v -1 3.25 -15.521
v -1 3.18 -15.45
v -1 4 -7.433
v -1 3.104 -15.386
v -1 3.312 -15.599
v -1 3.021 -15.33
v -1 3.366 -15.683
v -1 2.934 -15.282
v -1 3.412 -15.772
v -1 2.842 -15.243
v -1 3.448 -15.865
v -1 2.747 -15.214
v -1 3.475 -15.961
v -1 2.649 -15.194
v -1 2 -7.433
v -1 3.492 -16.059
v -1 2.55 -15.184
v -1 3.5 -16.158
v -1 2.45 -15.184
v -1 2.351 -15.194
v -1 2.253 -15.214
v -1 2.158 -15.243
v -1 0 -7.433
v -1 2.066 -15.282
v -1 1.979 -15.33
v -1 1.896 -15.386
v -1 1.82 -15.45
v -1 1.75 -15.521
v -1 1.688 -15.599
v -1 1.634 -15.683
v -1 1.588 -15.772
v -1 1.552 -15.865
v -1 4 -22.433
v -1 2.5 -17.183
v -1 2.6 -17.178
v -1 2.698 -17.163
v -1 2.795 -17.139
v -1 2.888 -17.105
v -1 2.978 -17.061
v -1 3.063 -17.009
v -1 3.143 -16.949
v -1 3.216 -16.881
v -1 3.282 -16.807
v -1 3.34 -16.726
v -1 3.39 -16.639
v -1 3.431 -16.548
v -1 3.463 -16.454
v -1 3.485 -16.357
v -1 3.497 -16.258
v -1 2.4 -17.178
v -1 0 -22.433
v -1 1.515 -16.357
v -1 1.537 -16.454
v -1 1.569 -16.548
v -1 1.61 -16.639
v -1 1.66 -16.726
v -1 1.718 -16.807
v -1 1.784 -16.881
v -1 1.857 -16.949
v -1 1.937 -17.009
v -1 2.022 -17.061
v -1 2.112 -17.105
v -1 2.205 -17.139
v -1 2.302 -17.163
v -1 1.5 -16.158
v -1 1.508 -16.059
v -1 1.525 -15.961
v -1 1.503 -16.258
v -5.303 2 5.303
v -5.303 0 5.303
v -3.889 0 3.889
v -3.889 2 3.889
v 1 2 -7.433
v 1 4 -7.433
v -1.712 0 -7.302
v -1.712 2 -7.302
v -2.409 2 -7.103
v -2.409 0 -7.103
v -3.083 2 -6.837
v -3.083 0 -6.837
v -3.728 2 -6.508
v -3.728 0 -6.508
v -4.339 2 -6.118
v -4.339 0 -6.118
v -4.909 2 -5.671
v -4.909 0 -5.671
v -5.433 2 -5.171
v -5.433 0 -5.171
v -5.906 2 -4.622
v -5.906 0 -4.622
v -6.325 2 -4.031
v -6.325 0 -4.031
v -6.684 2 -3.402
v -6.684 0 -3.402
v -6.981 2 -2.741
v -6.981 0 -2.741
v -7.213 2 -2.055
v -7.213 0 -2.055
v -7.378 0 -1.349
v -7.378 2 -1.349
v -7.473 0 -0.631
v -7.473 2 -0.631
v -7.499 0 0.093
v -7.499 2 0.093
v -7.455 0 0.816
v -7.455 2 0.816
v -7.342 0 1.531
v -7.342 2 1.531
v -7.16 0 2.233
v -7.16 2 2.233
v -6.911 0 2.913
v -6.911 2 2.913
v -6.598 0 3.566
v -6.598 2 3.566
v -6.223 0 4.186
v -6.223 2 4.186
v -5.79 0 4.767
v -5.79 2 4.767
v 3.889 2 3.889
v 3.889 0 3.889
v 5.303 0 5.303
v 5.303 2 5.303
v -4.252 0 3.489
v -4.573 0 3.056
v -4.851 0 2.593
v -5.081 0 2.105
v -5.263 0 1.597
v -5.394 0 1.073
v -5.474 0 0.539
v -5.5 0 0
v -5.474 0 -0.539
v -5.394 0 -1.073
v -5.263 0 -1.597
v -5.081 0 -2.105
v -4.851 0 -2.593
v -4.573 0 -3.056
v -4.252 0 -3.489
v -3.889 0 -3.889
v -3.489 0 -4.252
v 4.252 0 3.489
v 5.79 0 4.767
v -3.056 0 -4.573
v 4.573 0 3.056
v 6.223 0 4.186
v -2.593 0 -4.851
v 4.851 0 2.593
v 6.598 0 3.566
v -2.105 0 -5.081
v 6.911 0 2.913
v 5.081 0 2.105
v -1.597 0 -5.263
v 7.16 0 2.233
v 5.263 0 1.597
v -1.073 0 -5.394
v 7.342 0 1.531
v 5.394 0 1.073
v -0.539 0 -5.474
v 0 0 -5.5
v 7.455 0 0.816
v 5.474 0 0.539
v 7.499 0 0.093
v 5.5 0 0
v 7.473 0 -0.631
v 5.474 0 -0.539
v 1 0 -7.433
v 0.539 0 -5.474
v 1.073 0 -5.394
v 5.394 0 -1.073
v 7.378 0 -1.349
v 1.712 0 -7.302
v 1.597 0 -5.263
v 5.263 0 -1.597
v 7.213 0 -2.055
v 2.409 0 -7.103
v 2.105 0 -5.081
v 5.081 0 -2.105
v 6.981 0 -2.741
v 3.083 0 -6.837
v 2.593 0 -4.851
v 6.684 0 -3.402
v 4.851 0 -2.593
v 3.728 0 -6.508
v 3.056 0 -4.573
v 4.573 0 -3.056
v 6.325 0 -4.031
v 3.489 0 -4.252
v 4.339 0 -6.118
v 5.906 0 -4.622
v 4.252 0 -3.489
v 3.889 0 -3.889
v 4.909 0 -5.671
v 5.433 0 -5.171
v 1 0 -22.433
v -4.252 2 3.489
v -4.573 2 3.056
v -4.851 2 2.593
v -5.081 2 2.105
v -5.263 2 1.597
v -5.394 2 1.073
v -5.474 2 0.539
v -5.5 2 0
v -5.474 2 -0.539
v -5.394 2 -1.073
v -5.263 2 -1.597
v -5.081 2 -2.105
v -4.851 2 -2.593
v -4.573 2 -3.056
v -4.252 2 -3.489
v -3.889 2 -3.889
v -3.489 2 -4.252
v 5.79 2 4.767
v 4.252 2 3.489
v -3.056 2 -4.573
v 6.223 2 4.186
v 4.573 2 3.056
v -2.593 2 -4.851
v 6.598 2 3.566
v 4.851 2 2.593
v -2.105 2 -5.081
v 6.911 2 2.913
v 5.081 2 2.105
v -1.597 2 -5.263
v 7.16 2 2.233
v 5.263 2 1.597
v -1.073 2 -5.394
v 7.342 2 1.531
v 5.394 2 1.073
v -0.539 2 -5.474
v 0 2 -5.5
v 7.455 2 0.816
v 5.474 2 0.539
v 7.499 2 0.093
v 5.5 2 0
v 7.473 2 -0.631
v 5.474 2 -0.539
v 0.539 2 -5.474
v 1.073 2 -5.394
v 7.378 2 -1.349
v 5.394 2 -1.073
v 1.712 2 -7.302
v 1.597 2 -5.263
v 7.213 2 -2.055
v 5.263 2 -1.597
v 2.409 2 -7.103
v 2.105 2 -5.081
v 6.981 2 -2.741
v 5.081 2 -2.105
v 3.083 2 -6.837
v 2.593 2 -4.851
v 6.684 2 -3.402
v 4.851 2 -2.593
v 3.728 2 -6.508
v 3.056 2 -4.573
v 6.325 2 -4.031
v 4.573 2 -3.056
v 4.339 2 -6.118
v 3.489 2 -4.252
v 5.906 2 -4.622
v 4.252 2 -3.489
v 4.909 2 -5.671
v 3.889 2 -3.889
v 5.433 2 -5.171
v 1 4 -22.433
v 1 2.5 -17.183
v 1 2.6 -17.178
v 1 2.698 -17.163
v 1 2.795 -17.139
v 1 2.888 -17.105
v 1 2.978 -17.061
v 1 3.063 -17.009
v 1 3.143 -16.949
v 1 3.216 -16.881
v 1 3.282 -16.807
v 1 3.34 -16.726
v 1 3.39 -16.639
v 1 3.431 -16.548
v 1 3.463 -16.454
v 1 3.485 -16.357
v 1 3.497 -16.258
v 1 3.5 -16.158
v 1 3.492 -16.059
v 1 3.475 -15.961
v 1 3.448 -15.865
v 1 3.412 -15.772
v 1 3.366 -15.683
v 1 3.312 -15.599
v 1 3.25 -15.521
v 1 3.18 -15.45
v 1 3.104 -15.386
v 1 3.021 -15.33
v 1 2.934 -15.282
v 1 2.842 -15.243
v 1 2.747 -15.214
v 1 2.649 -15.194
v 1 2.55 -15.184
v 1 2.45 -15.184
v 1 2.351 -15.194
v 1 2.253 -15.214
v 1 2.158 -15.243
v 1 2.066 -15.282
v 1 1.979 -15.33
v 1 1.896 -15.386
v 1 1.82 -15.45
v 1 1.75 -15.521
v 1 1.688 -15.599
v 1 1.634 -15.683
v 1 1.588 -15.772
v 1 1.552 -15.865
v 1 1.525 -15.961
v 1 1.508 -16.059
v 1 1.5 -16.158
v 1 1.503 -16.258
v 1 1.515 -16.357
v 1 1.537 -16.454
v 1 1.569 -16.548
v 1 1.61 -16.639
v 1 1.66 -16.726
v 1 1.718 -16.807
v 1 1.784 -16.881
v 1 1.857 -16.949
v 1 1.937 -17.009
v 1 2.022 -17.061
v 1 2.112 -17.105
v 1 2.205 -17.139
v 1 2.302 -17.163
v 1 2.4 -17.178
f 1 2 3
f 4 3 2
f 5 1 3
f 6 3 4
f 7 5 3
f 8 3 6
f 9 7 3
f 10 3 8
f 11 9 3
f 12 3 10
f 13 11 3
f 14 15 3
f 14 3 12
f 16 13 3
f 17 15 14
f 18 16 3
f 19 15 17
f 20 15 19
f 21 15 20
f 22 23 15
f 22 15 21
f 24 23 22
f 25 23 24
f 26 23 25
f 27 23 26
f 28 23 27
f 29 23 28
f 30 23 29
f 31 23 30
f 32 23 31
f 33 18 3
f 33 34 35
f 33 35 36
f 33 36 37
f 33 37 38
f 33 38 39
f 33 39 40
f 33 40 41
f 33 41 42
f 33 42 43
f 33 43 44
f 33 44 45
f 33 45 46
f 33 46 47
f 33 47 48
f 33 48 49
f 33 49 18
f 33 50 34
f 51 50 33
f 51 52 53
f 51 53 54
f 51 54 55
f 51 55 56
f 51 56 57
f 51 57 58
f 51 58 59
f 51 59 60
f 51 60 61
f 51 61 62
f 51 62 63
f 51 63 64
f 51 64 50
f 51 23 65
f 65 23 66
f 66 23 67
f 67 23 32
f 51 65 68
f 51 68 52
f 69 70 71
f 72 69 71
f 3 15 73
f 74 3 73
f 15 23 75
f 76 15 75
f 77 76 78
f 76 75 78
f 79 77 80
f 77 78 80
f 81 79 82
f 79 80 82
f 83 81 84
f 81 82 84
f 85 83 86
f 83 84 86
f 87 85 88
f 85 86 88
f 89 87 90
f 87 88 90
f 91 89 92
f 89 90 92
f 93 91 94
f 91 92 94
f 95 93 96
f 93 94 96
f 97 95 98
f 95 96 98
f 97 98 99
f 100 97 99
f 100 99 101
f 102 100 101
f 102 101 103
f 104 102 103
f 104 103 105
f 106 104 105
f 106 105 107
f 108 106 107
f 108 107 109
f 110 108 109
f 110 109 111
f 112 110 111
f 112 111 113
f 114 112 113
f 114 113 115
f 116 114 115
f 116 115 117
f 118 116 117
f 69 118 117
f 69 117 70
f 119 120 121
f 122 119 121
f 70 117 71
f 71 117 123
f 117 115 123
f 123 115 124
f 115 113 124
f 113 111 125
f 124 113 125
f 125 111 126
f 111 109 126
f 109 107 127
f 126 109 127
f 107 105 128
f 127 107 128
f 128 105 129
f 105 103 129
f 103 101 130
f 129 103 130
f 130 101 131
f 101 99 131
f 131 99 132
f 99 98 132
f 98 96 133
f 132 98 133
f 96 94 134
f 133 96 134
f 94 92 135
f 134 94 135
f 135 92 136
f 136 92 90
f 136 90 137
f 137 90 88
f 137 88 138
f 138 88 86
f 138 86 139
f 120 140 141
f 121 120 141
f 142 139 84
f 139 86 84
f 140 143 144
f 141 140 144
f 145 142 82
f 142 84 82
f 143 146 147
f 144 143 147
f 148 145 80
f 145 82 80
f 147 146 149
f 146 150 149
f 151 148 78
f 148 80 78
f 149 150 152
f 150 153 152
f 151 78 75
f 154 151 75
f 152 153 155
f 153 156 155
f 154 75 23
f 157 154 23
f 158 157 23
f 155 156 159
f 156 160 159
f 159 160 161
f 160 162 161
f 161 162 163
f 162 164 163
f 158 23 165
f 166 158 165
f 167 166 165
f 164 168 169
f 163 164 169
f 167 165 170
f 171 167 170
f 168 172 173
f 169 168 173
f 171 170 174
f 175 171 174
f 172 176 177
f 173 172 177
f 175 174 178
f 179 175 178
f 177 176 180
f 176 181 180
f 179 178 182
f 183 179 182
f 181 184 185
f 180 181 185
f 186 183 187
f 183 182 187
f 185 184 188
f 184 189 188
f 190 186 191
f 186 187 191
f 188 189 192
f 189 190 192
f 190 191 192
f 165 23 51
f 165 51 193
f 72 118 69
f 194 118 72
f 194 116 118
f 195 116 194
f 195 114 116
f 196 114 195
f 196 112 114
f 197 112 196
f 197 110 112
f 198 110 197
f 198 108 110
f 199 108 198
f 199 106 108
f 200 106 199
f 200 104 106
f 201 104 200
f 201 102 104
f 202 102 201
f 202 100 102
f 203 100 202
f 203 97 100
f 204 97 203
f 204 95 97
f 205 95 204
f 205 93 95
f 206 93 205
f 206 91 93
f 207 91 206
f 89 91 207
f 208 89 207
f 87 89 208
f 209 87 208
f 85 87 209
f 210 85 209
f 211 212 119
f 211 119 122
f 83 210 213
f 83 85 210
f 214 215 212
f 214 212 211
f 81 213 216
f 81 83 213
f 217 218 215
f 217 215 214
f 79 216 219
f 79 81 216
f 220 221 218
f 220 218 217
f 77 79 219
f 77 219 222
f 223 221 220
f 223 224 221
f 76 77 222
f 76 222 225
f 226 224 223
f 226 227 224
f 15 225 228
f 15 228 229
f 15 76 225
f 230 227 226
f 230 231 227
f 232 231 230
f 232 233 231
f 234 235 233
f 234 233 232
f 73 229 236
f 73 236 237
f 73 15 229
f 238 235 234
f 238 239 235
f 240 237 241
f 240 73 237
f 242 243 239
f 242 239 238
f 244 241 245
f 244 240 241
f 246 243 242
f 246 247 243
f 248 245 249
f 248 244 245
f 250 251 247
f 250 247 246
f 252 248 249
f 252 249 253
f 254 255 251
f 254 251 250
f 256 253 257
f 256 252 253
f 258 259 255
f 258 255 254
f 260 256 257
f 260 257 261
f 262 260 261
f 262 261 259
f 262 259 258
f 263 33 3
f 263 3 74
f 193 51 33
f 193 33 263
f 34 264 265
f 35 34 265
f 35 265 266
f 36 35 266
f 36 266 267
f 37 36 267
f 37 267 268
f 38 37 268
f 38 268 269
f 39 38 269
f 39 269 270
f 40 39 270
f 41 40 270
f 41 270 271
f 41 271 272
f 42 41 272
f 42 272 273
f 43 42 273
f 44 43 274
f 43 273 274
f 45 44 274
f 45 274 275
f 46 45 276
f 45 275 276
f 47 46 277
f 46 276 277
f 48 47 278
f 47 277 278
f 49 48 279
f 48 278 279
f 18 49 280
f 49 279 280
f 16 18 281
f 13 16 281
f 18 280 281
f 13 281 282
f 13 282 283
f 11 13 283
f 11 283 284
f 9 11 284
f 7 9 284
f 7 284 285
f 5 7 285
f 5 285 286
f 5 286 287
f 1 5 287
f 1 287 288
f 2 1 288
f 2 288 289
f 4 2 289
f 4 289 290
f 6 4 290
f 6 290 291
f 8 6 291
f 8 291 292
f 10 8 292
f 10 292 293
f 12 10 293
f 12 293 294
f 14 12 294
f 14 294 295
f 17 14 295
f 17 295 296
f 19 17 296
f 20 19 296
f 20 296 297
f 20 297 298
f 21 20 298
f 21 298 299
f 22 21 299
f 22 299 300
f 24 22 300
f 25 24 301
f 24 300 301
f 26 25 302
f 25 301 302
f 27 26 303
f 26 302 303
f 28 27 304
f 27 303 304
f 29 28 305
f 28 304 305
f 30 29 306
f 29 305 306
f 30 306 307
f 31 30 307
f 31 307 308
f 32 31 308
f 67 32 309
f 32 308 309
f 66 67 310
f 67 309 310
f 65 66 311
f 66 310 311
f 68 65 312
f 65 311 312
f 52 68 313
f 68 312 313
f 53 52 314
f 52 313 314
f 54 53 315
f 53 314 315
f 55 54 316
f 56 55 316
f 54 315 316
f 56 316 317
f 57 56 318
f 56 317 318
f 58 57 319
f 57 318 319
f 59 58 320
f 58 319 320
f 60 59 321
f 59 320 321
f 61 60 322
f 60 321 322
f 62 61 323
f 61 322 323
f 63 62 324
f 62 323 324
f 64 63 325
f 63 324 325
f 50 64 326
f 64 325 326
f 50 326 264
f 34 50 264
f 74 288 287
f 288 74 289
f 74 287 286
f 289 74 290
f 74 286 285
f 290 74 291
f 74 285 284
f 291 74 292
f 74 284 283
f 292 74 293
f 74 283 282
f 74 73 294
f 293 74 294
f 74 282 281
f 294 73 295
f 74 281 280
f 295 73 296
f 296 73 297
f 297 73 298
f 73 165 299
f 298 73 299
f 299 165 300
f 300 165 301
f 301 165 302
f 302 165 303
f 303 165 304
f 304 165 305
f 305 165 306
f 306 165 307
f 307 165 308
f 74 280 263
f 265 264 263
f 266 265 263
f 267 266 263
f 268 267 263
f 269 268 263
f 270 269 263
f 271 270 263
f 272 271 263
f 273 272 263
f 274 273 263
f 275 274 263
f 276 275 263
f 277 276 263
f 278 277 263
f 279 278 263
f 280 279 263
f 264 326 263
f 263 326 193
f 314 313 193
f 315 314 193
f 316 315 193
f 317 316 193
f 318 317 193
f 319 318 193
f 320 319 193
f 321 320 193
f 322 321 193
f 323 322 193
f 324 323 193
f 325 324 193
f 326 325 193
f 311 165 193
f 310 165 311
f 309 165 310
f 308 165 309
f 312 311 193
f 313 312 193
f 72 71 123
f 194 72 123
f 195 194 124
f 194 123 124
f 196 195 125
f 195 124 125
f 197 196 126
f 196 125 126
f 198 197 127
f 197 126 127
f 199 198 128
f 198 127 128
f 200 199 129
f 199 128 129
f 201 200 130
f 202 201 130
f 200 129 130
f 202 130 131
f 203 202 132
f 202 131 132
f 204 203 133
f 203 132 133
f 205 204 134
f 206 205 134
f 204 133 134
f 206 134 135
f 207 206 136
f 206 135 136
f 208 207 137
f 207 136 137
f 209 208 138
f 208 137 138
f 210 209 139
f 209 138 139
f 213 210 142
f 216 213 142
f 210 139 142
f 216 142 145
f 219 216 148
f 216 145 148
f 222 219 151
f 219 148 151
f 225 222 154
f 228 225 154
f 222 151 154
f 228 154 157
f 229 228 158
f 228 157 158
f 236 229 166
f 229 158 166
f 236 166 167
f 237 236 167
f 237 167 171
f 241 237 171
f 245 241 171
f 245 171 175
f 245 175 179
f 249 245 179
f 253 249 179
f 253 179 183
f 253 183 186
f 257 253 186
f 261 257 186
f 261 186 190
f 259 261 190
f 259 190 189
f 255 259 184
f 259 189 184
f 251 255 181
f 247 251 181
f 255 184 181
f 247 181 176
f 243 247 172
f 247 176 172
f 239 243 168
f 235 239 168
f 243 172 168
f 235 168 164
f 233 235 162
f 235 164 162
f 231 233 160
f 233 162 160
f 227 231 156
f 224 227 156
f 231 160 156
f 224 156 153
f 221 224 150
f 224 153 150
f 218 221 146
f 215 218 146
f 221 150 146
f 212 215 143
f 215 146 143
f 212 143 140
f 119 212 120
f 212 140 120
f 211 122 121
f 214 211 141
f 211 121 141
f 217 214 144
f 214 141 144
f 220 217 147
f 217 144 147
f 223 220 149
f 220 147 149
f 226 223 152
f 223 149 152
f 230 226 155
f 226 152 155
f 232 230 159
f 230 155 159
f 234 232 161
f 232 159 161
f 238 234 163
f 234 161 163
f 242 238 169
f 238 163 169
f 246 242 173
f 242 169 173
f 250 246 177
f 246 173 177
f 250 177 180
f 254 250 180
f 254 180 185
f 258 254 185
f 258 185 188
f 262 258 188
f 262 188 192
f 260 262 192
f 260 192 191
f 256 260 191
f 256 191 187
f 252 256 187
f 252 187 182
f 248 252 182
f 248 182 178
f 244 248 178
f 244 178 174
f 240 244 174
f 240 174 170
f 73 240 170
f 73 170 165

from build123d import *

# Parameters (mm, degrees)
BOSS_EXTRUDE1_DEPTH      = 2
BOSS_EXTRUDE2_DEPTH      = 2
BOSS_EXTRUDE2_DEPTH_BACK = 2
SKETCH2_W                = 2
SKETCH2_H                = 15
SKETCH3_R                = 1
CUT_EXTRUDE1_DEPTH       = 25.320588628


with BuildPart() as part:
    # Sketch1 → Boss-Extrude1 (new body)
    with BuildSketch(Plane(origin=(0, 0, 0), x_dir=(1, 0, 0), z_dir=(0, 1, 0))):
        with BuildLine():
            Line((3.889087297, -3.889087297), (5.303300859, -5.303300859))
            ThreePointArc((5.303300859, -5.303300859), (0, 7.5), (-5.303300859, -5.303300859))
            Line((-5.303300859, -5.303300859), (-3.889087297, -3.889087297))
            ThreePointArc((-3.889087297, -3.889087297), (0, 5.5), (3.889087297, -3.889087297))
        make_face()
    extrude(amount=BOSS_EXTRUDE1_DEPTH)

    # Sketch2 → Boss-Extrude2 (add, two sides: drawn at the far end of the back side and taken through both)
    with BuildSketch(Plane(origin=(0, 2, 0), x_dir=(1, 0, 0), z_dir=(0, 1, 0)).offset(-BOSS_EXTRUDE2_DEPTH_BACK)):
        with Locations((0, 14.933034374)):
            Rectangle(SKETCH2_W, SKETCH2_H)
    extrude(amount=BOSS_EXTRUDE2_DEPTH + BOSS_EXTRUDE2_DEPTH_BACK)

    # Sketch3 → Cut-Extrude1 (cut, through all)
    with BuildSketch(Plane(origin=(1, 0, 0), x_dir=(0, 0, -1), z_dir=(1, 0, 0))):
        with Locations((16.183034374, 2.5)):
            Circle(SKETCH3_R)
    extrude(amount=-CUT_EXTRUDE1_DEPTH, mode=Mode.SUBTRACT)


solid = part.part
